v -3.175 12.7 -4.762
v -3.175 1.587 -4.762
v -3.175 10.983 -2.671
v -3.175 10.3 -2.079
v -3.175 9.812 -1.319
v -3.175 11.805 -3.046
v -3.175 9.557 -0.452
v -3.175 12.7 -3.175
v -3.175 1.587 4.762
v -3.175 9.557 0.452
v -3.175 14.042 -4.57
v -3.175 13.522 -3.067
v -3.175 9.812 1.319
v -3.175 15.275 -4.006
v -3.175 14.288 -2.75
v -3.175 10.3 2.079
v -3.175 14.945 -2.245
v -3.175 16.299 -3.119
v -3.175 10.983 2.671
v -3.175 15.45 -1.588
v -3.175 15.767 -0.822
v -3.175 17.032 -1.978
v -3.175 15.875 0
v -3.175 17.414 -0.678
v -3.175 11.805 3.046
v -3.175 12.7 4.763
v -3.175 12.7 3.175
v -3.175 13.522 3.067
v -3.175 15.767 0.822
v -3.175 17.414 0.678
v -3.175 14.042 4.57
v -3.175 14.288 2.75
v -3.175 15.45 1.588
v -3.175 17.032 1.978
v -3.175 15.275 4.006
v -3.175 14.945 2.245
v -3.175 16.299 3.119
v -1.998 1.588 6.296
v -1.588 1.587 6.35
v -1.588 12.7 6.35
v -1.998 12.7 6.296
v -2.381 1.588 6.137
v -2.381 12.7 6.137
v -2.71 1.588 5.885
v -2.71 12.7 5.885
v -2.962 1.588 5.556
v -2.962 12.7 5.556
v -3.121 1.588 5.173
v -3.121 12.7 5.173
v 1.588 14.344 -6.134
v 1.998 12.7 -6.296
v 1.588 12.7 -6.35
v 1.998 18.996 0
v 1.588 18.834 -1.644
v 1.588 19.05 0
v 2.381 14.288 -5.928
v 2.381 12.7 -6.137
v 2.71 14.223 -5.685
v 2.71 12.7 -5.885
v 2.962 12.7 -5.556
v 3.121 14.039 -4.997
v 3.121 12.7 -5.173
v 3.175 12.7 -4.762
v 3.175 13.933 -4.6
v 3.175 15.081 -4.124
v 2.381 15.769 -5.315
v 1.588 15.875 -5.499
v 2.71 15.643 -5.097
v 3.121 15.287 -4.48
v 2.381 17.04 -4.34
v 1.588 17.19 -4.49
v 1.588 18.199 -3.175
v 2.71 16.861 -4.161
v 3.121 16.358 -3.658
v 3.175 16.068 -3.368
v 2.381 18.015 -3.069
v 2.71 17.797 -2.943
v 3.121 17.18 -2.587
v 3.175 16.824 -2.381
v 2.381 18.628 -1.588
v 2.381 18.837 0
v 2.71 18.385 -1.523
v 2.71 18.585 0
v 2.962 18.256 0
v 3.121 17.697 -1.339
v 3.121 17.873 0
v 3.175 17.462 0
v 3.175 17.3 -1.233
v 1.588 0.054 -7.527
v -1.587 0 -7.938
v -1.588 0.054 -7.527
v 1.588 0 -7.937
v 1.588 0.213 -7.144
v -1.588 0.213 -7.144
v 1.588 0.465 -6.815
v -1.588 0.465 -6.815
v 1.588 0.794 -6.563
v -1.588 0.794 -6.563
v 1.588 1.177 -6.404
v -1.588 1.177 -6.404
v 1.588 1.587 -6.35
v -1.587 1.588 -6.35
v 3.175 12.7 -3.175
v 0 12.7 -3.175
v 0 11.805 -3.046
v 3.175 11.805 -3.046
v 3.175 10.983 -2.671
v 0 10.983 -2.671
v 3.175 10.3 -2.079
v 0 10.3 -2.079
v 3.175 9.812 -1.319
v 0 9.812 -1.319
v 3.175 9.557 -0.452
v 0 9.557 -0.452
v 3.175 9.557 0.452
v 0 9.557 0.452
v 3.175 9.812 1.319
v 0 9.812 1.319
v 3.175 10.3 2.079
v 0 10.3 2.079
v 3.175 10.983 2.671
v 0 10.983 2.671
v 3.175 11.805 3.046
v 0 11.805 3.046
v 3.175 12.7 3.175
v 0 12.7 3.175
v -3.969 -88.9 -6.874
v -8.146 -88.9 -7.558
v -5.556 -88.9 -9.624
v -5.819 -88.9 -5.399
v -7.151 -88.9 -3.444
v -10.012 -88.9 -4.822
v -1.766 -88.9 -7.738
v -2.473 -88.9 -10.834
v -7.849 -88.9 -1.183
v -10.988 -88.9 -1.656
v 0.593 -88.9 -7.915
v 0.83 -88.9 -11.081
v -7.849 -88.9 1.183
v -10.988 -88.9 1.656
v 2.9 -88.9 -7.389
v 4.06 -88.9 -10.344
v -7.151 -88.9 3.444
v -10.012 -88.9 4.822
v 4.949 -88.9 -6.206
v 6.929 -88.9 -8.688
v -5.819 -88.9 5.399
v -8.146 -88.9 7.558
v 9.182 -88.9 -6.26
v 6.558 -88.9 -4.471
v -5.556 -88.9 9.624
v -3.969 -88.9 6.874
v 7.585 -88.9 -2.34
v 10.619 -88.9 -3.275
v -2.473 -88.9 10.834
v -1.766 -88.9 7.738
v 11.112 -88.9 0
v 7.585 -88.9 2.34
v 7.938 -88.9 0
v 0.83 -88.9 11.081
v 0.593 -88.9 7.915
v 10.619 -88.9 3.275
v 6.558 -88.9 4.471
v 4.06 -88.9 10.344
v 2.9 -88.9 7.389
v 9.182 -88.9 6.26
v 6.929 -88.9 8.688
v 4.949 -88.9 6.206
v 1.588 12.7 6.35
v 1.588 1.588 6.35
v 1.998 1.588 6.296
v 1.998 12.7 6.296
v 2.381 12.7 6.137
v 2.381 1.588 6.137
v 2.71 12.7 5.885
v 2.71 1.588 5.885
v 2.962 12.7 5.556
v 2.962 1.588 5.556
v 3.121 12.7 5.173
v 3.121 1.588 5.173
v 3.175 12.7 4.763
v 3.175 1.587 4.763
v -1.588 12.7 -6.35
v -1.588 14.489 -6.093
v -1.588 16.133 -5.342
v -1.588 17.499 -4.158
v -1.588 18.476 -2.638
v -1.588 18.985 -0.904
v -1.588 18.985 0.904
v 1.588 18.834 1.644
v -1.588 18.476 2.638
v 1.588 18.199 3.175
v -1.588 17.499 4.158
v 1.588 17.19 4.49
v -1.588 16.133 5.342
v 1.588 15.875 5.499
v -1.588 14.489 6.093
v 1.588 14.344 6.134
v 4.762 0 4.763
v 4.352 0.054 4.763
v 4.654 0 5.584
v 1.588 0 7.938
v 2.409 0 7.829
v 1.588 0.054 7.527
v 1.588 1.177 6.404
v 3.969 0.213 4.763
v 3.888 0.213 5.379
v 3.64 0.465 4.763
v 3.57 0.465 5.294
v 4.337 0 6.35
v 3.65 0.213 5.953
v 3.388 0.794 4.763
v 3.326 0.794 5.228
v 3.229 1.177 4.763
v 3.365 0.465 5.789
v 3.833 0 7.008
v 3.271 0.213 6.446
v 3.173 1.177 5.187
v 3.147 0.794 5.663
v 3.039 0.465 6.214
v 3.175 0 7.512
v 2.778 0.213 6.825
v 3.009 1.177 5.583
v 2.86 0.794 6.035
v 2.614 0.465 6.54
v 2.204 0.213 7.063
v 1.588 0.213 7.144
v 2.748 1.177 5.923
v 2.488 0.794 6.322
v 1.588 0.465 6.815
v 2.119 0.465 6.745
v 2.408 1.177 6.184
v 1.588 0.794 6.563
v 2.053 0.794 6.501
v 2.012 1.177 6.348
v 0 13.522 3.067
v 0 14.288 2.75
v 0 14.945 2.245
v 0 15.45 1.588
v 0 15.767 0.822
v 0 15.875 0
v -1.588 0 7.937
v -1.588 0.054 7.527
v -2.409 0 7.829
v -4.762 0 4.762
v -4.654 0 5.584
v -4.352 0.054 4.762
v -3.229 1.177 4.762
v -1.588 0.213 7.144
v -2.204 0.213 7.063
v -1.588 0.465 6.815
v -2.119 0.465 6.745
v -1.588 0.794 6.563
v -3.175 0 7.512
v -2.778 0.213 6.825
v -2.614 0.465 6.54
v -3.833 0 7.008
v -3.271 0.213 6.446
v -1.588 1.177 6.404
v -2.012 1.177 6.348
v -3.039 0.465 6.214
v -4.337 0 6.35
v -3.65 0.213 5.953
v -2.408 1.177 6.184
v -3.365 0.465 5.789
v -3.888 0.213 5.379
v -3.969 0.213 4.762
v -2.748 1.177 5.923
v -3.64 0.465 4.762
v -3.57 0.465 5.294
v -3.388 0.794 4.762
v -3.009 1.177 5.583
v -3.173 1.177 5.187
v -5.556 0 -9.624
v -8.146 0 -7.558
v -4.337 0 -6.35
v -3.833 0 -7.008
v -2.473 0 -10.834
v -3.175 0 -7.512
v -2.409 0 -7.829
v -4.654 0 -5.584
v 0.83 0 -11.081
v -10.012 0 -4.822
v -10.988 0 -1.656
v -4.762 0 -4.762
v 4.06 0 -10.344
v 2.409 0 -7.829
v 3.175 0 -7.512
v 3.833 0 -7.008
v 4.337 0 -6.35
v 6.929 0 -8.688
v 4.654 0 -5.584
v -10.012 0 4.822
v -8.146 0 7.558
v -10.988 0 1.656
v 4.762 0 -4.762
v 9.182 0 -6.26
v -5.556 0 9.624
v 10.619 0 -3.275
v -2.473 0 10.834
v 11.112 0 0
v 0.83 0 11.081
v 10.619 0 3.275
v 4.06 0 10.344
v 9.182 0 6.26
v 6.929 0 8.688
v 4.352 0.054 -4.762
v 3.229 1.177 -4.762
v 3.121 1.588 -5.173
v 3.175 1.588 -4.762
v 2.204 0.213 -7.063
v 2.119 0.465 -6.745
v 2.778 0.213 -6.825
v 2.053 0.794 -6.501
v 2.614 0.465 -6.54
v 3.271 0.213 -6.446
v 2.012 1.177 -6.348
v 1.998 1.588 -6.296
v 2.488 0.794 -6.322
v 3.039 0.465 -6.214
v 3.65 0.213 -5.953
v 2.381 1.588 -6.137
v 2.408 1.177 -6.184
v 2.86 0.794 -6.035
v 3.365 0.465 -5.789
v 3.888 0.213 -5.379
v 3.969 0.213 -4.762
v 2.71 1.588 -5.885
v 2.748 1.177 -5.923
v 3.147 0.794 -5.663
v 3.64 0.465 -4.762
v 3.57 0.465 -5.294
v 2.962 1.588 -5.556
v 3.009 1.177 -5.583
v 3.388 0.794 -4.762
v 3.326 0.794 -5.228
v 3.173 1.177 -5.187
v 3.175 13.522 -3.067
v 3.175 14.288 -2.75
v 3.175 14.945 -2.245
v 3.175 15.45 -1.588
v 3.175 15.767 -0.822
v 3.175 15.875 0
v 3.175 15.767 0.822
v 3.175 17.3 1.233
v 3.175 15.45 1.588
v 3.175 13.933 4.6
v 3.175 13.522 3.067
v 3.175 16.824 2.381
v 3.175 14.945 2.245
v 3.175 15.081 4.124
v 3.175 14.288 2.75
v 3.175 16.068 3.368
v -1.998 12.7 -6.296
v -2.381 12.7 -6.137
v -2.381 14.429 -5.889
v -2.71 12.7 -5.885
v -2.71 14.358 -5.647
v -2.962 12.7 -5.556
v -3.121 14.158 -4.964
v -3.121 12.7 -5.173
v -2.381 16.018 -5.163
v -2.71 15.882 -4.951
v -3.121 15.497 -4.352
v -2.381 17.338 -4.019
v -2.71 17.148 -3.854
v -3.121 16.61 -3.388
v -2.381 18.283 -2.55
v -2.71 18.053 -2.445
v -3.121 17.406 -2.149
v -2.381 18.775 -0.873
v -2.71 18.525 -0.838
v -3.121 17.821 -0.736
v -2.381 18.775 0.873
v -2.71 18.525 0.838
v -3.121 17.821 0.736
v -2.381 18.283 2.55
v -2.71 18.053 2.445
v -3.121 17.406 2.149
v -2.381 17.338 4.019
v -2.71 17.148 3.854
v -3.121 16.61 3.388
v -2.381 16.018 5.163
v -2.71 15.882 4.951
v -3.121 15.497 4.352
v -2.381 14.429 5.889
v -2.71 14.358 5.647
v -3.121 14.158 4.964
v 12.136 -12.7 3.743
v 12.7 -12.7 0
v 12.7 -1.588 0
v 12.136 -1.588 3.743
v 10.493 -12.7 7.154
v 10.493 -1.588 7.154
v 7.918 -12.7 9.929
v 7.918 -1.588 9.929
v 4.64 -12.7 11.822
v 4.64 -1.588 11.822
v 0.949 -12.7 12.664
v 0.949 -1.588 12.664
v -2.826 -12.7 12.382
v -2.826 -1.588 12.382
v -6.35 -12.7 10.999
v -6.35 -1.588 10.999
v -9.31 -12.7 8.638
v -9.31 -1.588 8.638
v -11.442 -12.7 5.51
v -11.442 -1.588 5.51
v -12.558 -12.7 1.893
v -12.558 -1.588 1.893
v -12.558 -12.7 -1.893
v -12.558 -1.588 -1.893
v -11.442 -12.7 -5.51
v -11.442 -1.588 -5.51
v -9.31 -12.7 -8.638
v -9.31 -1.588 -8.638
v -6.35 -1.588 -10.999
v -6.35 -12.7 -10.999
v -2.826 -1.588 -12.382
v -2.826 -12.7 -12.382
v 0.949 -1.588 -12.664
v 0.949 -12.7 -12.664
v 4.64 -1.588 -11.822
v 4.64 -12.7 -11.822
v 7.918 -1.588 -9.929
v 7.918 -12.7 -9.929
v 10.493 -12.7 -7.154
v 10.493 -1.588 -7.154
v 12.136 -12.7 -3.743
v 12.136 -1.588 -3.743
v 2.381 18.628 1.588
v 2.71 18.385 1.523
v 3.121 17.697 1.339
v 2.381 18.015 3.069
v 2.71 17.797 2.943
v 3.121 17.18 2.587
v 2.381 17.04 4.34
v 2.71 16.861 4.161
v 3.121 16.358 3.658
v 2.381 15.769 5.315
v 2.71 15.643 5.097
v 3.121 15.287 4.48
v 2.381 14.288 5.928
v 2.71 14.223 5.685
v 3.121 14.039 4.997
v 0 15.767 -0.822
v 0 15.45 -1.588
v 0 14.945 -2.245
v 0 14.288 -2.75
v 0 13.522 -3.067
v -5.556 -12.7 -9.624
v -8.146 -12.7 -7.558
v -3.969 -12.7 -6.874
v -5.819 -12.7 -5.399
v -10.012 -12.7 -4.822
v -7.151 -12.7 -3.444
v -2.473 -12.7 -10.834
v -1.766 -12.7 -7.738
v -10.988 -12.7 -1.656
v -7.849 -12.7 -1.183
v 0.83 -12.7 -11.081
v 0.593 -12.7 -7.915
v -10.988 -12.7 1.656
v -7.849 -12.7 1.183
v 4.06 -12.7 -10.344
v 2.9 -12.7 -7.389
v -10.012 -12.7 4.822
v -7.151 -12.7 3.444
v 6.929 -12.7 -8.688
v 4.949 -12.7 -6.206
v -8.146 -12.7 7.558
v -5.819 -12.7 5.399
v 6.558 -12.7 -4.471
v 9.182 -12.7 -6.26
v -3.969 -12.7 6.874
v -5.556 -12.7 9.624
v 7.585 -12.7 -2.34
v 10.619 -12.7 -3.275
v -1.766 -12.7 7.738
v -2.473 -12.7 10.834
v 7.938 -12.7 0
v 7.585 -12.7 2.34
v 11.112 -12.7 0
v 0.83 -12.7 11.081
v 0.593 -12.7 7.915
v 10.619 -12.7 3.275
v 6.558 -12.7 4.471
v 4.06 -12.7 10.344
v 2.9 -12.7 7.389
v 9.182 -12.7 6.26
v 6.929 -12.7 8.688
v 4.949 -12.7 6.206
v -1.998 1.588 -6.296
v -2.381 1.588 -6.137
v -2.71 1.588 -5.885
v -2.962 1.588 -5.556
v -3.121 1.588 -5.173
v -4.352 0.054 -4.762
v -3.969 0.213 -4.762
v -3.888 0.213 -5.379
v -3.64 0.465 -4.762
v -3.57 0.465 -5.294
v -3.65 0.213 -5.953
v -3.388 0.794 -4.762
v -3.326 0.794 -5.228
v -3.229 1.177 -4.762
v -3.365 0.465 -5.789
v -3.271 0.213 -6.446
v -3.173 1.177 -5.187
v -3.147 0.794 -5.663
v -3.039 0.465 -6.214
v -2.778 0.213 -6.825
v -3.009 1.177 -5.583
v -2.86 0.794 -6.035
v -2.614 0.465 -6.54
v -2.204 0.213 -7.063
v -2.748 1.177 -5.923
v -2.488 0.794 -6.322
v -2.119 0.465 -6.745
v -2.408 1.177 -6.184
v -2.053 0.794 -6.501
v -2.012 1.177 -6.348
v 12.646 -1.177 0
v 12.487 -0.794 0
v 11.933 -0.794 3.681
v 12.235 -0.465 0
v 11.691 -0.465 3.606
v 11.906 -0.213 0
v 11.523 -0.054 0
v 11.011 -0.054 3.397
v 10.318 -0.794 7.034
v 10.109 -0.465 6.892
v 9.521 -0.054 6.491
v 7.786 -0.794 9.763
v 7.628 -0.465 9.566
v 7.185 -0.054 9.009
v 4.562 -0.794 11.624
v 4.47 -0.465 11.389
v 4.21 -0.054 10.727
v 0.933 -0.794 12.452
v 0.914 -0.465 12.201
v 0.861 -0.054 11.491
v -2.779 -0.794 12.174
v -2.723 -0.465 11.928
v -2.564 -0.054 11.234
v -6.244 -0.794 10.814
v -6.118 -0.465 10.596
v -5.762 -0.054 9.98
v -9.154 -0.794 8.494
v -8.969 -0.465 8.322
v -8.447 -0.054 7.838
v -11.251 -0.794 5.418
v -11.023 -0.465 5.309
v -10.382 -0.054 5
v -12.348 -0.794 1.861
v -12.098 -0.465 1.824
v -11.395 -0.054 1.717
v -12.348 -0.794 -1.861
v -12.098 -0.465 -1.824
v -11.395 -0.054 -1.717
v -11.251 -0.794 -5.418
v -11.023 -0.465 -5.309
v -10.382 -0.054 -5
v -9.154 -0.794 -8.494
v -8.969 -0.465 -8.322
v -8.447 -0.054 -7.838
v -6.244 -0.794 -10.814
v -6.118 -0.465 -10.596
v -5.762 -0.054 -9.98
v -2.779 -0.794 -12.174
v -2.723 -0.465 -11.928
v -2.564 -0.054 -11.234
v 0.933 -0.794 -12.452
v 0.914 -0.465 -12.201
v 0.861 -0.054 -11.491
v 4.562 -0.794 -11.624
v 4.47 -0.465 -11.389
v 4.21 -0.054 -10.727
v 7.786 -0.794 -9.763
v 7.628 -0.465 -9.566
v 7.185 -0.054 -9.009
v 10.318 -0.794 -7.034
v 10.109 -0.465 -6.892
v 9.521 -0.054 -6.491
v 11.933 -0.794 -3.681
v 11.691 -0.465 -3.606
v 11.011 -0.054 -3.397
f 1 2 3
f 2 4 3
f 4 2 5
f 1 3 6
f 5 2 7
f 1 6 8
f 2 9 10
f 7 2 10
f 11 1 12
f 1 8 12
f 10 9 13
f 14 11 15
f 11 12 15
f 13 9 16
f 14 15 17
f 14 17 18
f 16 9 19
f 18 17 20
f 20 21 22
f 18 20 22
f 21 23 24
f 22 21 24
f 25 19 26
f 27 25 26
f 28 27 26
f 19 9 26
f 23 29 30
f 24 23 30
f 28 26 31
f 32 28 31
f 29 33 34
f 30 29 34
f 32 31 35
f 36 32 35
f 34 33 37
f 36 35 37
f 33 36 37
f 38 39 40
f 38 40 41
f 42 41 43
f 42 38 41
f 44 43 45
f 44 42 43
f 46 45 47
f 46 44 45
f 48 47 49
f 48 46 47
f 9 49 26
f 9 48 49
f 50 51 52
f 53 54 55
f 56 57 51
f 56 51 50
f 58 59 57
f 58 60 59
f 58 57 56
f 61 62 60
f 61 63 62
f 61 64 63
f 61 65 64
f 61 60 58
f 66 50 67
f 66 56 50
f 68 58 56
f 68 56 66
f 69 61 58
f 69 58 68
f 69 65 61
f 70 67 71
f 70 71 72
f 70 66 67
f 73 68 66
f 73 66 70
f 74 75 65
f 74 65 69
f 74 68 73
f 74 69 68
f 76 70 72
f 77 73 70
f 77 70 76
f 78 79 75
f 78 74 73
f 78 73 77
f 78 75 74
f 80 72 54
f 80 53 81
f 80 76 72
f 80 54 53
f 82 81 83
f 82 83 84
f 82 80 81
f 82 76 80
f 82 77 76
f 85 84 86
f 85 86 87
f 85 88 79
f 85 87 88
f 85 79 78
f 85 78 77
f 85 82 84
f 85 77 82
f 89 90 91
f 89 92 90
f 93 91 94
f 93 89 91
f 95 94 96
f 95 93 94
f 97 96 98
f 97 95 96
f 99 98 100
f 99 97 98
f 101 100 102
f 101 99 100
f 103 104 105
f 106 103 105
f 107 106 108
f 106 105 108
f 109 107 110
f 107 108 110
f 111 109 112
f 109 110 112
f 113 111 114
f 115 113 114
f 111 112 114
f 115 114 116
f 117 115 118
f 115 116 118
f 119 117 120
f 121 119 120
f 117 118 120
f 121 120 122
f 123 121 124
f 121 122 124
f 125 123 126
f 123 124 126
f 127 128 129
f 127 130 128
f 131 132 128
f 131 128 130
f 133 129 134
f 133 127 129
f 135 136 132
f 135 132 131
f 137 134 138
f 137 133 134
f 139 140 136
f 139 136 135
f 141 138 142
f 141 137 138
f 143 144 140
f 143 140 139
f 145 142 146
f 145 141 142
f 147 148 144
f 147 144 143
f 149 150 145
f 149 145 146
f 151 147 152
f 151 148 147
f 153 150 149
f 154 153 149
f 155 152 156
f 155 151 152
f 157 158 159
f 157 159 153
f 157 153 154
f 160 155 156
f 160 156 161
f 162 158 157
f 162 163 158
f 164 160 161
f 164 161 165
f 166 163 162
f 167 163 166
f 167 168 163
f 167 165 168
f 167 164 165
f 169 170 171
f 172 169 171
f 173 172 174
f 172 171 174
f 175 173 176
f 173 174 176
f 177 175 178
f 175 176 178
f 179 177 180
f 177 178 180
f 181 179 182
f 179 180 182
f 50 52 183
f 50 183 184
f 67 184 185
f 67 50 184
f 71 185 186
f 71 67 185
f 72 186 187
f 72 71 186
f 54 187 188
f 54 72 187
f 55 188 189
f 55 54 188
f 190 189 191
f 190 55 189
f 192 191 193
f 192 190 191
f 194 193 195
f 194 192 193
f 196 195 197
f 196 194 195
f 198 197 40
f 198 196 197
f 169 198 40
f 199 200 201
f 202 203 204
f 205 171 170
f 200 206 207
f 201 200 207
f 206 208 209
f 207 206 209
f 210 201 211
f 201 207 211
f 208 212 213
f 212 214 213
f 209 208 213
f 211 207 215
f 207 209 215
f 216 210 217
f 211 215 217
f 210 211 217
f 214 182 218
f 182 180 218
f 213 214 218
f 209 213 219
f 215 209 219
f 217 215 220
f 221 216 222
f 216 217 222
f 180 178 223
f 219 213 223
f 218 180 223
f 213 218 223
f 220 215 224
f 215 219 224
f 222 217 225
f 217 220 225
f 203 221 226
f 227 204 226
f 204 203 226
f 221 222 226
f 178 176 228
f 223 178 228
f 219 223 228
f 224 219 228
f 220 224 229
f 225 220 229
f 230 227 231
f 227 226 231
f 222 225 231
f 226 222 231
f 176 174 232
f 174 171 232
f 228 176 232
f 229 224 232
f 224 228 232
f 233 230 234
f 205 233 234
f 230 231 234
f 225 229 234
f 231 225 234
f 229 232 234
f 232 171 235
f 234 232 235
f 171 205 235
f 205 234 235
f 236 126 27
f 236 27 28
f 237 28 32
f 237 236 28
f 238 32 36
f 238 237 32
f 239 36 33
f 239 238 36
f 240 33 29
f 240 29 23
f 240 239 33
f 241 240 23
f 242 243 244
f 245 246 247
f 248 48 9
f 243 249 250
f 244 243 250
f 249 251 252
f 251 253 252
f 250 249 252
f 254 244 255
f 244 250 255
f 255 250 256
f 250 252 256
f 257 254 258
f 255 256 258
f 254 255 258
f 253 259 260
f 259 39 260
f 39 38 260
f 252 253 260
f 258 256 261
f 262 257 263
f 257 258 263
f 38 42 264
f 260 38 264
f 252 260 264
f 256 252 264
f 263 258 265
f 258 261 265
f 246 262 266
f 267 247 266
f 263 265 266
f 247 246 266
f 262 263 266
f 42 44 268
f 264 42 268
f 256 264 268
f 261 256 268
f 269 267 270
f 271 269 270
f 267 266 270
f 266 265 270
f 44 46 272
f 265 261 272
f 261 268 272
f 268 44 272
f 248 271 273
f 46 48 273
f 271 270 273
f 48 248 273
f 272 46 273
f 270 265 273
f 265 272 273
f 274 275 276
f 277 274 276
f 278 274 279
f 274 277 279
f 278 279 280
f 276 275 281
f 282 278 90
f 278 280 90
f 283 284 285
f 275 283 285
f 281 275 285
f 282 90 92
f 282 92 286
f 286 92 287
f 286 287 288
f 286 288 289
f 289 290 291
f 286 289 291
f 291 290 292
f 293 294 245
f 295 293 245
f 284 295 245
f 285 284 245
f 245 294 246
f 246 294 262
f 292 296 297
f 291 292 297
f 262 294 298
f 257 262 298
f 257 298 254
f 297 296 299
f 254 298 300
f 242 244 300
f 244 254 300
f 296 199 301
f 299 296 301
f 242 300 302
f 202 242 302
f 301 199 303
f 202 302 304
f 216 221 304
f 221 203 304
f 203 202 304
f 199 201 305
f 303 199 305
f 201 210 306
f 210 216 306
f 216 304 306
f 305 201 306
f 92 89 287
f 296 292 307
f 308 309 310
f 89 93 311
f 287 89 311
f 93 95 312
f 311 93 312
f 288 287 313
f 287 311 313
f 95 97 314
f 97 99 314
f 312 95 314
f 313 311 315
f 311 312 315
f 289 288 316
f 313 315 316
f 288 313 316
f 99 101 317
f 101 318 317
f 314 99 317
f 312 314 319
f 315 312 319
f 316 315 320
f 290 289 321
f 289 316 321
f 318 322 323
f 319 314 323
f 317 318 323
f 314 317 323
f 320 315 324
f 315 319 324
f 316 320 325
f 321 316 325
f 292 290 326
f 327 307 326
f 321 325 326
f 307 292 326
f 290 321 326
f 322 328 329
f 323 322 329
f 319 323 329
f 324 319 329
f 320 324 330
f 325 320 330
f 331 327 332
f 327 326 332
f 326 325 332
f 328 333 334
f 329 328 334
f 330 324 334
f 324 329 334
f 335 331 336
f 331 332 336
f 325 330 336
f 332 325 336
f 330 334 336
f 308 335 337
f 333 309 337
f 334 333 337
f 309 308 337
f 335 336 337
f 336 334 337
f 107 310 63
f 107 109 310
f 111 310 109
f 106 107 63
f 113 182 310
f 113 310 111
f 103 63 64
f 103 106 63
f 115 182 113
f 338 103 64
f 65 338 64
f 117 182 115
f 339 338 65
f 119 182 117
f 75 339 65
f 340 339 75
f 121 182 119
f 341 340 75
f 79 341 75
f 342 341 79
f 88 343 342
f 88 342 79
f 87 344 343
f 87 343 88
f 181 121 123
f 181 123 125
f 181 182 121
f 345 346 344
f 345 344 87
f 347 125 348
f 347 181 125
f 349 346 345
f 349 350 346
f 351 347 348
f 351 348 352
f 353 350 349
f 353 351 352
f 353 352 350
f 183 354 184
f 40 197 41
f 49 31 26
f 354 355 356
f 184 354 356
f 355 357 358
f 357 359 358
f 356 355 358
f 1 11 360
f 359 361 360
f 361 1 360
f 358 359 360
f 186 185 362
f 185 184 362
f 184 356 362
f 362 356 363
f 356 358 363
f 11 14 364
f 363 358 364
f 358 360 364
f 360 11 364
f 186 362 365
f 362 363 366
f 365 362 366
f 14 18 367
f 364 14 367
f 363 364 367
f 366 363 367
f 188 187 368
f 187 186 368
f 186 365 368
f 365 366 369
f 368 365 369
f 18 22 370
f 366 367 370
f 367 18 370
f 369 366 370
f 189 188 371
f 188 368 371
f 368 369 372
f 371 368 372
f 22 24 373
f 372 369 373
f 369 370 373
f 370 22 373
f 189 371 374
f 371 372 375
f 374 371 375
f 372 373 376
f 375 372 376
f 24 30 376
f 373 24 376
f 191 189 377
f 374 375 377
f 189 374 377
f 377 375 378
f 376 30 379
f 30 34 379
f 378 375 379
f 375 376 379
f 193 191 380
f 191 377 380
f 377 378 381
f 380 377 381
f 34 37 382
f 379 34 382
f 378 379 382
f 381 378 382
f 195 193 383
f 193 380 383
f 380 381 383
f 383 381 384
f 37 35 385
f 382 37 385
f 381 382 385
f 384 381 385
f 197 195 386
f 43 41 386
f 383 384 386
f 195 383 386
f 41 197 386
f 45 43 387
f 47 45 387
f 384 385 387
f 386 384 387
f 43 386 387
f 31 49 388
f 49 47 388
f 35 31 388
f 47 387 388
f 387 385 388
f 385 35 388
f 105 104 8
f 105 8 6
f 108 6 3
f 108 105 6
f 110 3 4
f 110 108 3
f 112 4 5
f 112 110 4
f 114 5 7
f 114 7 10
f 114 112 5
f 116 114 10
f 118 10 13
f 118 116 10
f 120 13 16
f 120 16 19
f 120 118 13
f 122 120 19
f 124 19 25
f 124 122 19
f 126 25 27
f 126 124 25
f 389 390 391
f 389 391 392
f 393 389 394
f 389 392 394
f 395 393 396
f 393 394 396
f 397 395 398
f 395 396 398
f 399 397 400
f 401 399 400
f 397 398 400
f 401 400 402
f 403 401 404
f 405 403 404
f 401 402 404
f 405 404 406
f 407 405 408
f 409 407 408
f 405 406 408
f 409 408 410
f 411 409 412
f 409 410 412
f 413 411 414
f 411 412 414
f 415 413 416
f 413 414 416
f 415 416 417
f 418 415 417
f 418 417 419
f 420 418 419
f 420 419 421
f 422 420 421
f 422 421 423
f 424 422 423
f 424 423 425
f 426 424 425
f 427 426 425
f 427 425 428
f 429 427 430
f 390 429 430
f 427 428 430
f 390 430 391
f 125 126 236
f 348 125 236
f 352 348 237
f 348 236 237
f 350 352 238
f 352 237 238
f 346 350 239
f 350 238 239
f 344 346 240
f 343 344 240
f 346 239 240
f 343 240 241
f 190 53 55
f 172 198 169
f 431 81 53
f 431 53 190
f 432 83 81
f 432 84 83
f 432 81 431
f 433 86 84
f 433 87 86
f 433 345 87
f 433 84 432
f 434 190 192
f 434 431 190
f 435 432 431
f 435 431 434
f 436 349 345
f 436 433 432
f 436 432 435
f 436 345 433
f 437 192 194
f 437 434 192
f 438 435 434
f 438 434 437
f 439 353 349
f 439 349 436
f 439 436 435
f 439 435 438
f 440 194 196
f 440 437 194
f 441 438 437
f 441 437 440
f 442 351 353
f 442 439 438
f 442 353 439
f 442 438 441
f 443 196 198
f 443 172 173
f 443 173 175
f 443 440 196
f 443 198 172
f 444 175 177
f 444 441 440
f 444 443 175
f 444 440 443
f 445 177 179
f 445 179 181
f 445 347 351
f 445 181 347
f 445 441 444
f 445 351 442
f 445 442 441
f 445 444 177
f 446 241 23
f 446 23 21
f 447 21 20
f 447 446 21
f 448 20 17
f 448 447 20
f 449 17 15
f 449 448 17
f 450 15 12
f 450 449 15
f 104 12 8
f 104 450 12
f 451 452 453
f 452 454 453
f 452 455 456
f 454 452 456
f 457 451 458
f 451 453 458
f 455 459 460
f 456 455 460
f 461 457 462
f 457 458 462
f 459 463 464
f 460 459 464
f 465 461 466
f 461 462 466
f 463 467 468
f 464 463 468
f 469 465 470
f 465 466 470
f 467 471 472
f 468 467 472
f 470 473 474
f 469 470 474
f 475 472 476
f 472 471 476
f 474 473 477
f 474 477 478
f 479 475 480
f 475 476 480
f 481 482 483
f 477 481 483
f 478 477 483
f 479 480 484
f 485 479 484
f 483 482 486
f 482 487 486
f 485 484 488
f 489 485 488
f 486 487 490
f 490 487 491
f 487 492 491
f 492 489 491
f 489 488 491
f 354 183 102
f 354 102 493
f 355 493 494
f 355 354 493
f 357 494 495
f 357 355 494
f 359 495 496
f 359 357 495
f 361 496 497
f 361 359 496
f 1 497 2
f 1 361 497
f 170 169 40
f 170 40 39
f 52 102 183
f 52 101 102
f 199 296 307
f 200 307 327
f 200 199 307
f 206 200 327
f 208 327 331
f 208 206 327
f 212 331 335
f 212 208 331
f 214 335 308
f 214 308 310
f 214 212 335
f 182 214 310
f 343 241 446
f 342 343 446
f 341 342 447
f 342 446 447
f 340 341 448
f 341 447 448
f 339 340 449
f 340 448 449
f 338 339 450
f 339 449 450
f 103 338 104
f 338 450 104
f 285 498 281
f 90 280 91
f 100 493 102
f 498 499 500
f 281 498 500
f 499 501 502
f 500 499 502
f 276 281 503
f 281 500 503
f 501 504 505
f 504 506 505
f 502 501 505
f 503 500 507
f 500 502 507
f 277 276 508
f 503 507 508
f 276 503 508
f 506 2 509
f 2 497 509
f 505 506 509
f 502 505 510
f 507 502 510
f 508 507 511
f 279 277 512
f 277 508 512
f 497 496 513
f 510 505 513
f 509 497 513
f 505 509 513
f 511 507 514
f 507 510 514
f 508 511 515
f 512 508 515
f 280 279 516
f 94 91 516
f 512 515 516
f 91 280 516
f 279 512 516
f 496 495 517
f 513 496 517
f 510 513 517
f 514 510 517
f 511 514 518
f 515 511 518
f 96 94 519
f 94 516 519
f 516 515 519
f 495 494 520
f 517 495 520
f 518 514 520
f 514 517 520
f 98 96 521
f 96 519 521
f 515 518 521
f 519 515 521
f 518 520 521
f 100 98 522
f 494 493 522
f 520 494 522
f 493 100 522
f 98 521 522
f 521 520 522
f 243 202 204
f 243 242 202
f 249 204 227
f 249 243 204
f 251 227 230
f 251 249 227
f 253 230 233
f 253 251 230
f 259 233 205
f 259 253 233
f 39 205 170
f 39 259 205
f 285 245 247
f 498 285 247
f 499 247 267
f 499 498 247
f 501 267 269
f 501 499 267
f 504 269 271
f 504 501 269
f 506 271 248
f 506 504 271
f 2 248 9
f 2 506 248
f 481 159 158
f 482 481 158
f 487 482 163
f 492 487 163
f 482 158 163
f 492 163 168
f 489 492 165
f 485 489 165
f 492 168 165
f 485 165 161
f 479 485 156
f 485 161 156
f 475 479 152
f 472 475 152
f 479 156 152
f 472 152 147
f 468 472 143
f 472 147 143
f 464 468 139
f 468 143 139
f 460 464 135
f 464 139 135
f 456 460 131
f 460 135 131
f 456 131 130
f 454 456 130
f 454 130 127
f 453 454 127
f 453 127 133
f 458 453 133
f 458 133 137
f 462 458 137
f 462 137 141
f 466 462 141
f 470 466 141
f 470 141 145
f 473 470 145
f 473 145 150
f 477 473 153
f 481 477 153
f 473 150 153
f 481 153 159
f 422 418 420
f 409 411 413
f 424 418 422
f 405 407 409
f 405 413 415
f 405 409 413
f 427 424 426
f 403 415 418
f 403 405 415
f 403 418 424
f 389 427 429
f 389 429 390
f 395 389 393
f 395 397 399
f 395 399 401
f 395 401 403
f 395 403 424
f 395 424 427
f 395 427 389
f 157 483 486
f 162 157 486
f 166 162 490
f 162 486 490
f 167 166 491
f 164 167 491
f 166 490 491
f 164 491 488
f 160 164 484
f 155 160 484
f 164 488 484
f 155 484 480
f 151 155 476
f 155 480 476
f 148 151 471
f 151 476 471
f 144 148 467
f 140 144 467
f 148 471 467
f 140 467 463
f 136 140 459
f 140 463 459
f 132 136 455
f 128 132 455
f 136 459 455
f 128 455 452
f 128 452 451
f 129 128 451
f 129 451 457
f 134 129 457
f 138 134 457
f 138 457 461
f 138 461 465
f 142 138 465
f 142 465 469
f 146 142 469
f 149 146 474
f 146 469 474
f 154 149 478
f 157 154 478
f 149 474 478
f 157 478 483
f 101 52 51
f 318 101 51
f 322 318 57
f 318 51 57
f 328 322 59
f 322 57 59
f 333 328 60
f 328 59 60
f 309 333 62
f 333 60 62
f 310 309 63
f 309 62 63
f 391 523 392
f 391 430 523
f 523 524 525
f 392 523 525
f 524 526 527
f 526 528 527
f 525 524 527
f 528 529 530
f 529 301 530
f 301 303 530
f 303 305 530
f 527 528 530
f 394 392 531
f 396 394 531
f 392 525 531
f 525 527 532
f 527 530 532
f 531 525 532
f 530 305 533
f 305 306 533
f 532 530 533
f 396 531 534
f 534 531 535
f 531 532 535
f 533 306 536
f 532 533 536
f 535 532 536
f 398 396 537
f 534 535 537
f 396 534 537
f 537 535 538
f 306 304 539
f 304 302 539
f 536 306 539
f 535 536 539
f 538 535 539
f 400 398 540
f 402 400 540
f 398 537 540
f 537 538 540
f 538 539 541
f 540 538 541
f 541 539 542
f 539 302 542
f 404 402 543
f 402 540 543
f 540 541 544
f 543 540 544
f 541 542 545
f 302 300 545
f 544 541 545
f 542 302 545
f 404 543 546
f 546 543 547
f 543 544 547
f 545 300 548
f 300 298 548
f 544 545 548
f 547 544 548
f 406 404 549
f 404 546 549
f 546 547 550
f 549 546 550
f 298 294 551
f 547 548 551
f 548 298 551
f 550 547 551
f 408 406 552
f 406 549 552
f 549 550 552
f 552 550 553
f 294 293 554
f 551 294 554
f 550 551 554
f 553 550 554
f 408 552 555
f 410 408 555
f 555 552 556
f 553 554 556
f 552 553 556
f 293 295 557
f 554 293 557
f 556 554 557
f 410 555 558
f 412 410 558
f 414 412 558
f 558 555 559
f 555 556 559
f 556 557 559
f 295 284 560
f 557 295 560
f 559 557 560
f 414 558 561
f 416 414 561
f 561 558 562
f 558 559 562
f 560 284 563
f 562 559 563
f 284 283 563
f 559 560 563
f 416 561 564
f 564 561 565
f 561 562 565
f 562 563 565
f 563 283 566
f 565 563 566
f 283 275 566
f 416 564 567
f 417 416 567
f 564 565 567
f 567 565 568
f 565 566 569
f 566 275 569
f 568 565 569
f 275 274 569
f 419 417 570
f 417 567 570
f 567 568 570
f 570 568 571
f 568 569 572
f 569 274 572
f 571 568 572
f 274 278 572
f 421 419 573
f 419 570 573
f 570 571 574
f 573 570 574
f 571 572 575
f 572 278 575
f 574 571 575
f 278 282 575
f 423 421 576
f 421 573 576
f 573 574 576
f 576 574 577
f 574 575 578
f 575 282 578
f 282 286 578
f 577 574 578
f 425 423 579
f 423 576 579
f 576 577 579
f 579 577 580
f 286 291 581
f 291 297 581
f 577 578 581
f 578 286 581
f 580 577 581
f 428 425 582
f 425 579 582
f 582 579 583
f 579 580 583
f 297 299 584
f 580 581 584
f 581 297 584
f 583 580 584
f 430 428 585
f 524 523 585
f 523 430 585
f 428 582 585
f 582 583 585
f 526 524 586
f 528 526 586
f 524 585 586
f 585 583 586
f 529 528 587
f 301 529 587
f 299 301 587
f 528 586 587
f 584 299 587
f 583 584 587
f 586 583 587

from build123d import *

# Parameters (mm, degrees)
F0_R     = 12.7
F1_DEPTH = 12.7
F3_DEPTH = 3.175
F4_F1_R  = 1.5875
F4_F2_R  = 1.5875
F5_R     = 11.1125
F6_DEPTH = 76.2
F7_R     = 7.9375
F8_DEPTH = 76.2


with BuildPart() as f1:
    # F0 (on Front) → F1 (new body)
    with BuildSketch(Plane.XZ):
        Circle(F0_R)
    extrude(amount=F1_DEPTH)

    # F2 (on Right) → F3 (join, symmetric)
    with BuildSketch(Plane.YZ):
        with BuildLine():
            Line((0, 6.35), (0, -6.35))
            Line((0, -6.35), (12.7, -6.35))
            ThreePointArc((12.7, -6.35), (6.35, 0), (12.7, 6.35))
            Line((12.7, 6.35), (0, 6.35))
        make_face()
        with BuildLine():
            ThreePointArc((12.7, 6.35), (6.35, 0), (12.7, -6.35))
            Line((12.7, -6.35), (12.7, -3.175))
            ThreePointArc((12.7, -3.175), (9.525, 0), (12.7, 3.175))
            Line((12.7, 3.175), (12.7, 6.35))
        make_face()
        with BuildLine():
            Line((12.7, -3.175), (12.7, -6.35))
            ThreePointArc((12.7, -6.35), (17.1901280605, -4.4901280605), (19.05, 0))
            ThreePointArc((19.05, 0), (17.1901280605, 4.4901280605), (12.7, 6.35))
            Line((12.7, 6.35), (12.7, 3.175))
            ThreePointArc((12.7, 3.175), (14.9450640303, 2.2450640303), (15.875, 0))
            ThreePointArc((15.875, 0), (14.9450640303, -2.2450640303), (12.7, -3.175))
        make_face()
    extrude(amount=F3_DEPTH, both=True)

    # F4: fillet of radius 1.5875 on 10 edges, made by hand

    # F4_f1
    f4_f1_edges = [f1.edges().sort_by_distance(p)[0] for p in [
        (-12.7, 0, 0),
        (3.175, 6.35, 6.35),
        (-3.175, 6.35, 6.35),
        (-3.175, 6.35, -6.35),
        (-3.175, 19.05, 0),
        (3.175, 6.35, -6.35),
        (3.175, 19.05, 0),
    ]]
    fillet(f4_f1_edges, radius=F4_F1_R)

    # F4_f2
    f4_f2_edges = [f1.edges().sort_by_distance(p)[0] for p in [
        (-3.175, 0, 0),
        (0, 0, 6.35),
        (3.175, 0, 0),
        (2.7100320151, 0, 5.8850320151),
        (2.7100320151, 0, -5.8850320151),
        (-2.7100320151, 0, 5.8850320151),
        (-2.7100320151, 0, -5.8850320151),
    ]]
    fillet(f4_f2_edges, radius=F4_F2_R)


with BuildPart() as f6:
    # F5 (on face) → F6 (new body)
    with BuildSketch(Plane.XZ.offset(12.7)):
        Circle(F5_R)
    extrude(amount=F6_DEPTH)

    # F7 (on face) → F8 (cut)
    with BuildSketch(Plane.XZ.offset(88.9)):
        Circle(F7_R)
    extrude(amount=-F8_DEPTH, mode=Mode.SUBTRACT)


solid = Compound([f1.part, f6.part])
